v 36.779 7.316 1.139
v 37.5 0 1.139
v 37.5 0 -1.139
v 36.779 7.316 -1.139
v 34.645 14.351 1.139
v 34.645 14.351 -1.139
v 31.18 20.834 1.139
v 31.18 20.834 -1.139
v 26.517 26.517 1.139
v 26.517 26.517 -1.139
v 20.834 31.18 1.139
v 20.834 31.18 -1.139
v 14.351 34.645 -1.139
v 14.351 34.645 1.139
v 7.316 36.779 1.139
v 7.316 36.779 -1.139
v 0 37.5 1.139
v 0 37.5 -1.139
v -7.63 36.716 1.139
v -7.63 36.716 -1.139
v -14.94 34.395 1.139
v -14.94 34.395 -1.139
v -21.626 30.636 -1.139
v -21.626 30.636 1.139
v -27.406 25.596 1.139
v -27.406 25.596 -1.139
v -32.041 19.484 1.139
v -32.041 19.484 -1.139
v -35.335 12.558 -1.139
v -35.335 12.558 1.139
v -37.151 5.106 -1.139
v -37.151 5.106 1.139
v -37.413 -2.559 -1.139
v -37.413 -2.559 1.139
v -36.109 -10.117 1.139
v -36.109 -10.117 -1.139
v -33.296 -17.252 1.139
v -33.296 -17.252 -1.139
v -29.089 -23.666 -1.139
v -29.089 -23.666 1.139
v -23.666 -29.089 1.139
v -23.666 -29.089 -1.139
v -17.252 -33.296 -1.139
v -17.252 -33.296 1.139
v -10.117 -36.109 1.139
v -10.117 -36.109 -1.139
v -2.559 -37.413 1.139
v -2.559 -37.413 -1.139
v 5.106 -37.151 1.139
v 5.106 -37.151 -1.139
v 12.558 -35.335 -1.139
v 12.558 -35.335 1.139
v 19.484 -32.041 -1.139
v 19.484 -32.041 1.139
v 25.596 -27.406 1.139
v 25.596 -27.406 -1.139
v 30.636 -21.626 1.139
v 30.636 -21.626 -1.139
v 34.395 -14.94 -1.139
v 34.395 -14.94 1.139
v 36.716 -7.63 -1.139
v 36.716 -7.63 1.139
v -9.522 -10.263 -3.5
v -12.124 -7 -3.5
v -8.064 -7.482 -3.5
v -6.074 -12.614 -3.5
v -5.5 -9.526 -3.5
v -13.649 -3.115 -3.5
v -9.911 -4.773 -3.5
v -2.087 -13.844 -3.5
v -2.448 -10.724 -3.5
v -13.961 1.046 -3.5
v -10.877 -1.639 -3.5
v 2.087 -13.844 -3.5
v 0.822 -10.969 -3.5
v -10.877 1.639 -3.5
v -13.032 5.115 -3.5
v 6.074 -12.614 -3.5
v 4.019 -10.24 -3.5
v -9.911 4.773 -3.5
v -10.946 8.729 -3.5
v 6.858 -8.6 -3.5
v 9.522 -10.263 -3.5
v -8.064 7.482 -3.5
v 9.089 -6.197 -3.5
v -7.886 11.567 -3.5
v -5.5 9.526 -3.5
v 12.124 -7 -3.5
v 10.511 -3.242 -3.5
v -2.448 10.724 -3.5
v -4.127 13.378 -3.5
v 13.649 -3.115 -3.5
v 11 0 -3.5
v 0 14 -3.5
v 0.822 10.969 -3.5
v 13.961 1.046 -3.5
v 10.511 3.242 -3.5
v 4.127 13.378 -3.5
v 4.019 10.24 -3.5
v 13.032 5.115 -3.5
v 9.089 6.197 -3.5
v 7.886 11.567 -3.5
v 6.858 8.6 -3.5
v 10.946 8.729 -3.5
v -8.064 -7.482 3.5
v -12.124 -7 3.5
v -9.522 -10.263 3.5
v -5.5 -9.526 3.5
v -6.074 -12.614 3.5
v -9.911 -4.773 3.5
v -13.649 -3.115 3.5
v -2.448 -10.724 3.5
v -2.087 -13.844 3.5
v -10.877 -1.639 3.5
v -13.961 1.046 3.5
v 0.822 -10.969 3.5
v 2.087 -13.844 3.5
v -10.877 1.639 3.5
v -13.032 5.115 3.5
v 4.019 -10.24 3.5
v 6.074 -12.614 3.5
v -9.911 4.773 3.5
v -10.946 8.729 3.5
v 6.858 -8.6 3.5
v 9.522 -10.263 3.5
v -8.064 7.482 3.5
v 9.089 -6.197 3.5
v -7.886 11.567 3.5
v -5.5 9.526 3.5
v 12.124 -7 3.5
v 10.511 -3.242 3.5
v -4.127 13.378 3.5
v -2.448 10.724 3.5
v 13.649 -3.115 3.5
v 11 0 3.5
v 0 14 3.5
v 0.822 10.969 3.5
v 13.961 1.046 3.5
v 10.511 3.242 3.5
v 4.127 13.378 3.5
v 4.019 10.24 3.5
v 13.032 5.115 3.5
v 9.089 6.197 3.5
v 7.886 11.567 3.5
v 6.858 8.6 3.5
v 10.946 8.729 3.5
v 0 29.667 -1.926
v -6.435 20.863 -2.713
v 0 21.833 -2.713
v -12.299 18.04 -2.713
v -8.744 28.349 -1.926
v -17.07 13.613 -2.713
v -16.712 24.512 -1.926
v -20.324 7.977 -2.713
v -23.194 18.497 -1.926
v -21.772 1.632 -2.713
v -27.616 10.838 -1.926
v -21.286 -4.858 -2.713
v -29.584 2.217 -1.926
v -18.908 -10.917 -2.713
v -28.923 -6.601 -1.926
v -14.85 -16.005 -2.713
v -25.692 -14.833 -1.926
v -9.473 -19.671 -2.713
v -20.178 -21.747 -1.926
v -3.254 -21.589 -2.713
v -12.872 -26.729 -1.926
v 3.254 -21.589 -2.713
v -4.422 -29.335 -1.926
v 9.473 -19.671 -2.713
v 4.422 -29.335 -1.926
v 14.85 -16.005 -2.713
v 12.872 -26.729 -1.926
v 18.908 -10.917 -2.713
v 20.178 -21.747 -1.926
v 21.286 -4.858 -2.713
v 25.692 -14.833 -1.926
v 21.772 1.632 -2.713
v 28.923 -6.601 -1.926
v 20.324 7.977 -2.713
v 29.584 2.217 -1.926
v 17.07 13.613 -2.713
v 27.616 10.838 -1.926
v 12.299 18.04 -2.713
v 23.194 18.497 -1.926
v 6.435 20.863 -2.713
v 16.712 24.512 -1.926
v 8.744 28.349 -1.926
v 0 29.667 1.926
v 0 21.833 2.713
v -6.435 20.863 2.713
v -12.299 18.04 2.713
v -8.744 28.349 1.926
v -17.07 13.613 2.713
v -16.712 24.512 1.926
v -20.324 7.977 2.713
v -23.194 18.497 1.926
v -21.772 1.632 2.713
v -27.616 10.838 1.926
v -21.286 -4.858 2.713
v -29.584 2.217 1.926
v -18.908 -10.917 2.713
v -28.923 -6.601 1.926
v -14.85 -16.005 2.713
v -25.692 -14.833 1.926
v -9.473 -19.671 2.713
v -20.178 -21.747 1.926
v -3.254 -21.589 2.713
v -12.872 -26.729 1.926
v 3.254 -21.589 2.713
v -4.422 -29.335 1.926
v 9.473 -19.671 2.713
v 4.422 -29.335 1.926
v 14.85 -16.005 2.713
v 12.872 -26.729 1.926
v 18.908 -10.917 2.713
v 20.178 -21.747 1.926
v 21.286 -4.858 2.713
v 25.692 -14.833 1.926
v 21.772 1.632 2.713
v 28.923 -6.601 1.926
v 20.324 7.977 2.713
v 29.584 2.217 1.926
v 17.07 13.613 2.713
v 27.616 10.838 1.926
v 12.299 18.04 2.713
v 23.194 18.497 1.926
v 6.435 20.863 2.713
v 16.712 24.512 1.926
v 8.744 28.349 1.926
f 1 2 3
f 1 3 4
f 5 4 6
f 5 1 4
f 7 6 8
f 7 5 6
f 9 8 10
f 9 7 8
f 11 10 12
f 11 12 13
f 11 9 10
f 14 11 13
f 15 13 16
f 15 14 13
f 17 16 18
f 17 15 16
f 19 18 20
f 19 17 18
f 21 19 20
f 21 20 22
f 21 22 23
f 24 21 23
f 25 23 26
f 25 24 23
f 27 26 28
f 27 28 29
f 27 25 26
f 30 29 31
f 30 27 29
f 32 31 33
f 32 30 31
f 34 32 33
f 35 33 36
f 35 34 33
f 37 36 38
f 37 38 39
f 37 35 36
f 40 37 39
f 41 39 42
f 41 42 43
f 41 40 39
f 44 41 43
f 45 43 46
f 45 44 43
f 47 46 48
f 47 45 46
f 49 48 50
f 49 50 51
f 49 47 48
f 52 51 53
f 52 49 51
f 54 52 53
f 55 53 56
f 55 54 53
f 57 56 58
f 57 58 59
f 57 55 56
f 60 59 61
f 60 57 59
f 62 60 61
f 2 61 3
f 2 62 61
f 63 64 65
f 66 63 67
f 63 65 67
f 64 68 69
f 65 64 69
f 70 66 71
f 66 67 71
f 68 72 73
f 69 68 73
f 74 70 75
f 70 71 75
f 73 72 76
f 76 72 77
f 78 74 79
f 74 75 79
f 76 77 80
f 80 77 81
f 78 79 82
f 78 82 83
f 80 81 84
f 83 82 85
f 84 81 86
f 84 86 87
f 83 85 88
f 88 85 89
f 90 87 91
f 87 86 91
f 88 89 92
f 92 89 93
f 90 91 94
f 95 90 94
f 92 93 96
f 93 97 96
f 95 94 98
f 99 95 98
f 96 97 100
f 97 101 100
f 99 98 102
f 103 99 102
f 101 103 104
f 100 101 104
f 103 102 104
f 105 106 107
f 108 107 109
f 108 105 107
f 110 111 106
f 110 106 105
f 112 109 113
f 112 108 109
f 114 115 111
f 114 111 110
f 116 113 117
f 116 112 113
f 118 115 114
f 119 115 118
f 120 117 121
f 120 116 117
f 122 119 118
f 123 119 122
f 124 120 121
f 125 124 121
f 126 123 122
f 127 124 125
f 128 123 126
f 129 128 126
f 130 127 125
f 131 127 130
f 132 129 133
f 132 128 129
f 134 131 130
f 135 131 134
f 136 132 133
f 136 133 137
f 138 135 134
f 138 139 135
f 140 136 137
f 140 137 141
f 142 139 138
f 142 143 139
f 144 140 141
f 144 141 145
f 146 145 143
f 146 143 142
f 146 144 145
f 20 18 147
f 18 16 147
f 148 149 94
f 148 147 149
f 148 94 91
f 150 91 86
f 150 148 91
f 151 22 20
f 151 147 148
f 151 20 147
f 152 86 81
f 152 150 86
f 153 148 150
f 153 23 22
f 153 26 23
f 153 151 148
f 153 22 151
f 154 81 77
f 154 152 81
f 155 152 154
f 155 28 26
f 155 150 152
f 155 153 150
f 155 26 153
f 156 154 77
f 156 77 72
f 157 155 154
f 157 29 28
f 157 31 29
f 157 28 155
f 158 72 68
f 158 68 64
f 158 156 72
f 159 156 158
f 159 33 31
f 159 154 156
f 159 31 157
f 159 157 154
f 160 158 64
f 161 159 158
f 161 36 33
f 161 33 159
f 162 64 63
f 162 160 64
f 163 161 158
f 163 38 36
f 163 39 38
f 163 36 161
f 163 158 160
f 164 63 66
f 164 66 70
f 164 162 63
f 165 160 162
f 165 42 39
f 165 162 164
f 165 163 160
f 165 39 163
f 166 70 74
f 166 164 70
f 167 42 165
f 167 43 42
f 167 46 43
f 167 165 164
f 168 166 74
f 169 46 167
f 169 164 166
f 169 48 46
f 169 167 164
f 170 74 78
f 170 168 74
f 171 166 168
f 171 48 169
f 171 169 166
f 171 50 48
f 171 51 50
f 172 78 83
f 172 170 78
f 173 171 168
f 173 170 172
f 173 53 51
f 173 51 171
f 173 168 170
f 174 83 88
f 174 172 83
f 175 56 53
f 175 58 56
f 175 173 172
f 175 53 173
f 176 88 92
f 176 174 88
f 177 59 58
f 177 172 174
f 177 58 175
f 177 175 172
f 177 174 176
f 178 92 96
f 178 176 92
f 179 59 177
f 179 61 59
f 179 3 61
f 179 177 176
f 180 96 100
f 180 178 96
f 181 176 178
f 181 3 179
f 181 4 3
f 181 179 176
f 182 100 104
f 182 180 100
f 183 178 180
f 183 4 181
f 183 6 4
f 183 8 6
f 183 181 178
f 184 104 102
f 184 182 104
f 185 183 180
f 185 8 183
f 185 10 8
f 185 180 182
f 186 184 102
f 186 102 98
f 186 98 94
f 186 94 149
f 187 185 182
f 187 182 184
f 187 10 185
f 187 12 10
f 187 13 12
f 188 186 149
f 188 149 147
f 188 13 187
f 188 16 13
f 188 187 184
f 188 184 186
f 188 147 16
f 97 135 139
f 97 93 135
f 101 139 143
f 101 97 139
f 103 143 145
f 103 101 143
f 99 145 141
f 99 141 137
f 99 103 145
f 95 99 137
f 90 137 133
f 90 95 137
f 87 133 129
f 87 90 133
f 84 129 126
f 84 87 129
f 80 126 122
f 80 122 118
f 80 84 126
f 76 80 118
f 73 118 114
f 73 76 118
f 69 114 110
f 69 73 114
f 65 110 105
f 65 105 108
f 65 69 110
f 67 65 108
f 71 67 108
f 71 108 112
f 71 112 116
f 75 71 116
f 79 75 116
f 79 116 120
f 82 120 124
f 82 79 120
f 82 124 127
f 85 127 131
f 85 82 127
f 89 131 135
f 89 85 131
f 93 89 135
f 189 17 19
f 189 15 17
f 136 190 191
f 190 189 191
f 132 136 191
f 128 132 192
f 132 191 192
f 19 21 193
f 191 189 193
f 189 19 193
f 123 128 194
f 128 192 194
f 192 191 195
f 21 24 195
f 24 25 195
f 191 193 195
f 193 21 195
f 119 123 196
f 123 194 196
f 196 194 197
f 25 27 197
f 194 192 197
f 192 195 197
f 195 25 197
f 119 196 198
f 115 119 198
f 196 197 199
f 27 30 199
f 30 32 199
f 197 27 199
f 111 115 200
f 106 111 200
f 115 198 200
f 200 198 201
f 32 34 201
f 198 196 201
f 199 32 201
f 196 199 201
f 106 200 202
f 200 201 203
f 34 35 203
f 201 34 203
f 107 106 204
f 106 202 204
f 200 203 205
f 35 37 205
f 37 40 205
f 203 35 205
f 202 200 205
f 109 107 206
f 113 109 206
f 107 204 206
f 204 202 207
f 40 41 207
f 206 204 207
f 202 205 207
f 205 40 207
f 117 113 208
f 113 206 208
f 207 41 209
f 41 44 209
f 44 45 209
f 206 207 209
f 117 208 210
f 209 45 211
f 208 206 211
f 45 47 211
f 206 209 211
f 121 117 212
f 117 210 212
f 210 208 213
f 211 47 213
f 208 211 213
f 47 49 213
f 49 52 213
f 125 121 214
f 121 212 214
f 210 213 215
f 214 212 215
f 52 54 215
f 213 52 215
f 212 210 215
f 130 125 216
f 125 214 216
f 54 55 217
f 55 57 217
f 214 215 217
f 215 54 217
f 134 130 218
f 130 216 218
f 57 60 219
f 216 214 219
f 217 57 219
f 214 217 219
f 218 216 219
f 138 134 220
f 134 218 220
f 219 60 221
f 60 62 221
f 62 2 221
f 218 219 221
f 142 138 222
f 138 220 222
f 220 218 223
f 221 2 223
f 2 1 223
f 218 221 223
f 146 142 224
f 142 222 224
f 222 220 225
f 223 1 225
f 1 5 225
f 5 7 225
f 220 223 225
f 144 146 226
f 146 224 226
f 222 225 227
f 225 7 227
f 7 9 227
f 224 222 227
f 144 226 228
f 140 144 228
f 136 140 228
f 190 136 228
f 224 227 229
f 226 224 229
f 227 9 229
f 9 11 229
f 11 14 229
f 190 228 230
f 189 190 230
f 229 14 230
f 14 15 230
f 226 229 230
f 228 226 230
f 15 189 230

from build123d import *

# Parameters (mm, degrees)
F0_R     = 37.5
F0_R_2   = 11
F1_DEPTH = 3.5


# Not quite as in the source:
# - a pattern or mirror of a feature is missing from the dataset's text; its kind, count and spacing are read off the source's solid


with BuildPart() as f1:
    # F0 (on Top) → F1 (new body, symmetric)
    with BuildSketch(Plane.XY):
        Circle(F0_R)
        Circle(F0_R_2, mode=Mode.SUBTRACT)
    extrude(amount=F1_DEPTH, both=True)

    # F2 (on Right) → F3 (revolve, cut)
    with BuildSketch(Plane.YZ):
        Polygon((43.8578222282, 0.5), (43.8578222282, 0), (53.1842447817, 0), (53.1842447817, 16.8883297592), (14, 16.8883297592), (14, 3.5), align=None)
    f3 = revolve(axis=Axis((0, 0, 12.1004180983), (0, 0, 1)), mode=Mode.SUBTRACT)

    # F3_copies: F3 across plane
    add(f3.mirror(Plane(origin=(0, 0, 0), x_dir=(-1, 0, 0), z_dir=(0, 0, -1))), mode=Mode.SUBTRACT)


solid = f1.part
